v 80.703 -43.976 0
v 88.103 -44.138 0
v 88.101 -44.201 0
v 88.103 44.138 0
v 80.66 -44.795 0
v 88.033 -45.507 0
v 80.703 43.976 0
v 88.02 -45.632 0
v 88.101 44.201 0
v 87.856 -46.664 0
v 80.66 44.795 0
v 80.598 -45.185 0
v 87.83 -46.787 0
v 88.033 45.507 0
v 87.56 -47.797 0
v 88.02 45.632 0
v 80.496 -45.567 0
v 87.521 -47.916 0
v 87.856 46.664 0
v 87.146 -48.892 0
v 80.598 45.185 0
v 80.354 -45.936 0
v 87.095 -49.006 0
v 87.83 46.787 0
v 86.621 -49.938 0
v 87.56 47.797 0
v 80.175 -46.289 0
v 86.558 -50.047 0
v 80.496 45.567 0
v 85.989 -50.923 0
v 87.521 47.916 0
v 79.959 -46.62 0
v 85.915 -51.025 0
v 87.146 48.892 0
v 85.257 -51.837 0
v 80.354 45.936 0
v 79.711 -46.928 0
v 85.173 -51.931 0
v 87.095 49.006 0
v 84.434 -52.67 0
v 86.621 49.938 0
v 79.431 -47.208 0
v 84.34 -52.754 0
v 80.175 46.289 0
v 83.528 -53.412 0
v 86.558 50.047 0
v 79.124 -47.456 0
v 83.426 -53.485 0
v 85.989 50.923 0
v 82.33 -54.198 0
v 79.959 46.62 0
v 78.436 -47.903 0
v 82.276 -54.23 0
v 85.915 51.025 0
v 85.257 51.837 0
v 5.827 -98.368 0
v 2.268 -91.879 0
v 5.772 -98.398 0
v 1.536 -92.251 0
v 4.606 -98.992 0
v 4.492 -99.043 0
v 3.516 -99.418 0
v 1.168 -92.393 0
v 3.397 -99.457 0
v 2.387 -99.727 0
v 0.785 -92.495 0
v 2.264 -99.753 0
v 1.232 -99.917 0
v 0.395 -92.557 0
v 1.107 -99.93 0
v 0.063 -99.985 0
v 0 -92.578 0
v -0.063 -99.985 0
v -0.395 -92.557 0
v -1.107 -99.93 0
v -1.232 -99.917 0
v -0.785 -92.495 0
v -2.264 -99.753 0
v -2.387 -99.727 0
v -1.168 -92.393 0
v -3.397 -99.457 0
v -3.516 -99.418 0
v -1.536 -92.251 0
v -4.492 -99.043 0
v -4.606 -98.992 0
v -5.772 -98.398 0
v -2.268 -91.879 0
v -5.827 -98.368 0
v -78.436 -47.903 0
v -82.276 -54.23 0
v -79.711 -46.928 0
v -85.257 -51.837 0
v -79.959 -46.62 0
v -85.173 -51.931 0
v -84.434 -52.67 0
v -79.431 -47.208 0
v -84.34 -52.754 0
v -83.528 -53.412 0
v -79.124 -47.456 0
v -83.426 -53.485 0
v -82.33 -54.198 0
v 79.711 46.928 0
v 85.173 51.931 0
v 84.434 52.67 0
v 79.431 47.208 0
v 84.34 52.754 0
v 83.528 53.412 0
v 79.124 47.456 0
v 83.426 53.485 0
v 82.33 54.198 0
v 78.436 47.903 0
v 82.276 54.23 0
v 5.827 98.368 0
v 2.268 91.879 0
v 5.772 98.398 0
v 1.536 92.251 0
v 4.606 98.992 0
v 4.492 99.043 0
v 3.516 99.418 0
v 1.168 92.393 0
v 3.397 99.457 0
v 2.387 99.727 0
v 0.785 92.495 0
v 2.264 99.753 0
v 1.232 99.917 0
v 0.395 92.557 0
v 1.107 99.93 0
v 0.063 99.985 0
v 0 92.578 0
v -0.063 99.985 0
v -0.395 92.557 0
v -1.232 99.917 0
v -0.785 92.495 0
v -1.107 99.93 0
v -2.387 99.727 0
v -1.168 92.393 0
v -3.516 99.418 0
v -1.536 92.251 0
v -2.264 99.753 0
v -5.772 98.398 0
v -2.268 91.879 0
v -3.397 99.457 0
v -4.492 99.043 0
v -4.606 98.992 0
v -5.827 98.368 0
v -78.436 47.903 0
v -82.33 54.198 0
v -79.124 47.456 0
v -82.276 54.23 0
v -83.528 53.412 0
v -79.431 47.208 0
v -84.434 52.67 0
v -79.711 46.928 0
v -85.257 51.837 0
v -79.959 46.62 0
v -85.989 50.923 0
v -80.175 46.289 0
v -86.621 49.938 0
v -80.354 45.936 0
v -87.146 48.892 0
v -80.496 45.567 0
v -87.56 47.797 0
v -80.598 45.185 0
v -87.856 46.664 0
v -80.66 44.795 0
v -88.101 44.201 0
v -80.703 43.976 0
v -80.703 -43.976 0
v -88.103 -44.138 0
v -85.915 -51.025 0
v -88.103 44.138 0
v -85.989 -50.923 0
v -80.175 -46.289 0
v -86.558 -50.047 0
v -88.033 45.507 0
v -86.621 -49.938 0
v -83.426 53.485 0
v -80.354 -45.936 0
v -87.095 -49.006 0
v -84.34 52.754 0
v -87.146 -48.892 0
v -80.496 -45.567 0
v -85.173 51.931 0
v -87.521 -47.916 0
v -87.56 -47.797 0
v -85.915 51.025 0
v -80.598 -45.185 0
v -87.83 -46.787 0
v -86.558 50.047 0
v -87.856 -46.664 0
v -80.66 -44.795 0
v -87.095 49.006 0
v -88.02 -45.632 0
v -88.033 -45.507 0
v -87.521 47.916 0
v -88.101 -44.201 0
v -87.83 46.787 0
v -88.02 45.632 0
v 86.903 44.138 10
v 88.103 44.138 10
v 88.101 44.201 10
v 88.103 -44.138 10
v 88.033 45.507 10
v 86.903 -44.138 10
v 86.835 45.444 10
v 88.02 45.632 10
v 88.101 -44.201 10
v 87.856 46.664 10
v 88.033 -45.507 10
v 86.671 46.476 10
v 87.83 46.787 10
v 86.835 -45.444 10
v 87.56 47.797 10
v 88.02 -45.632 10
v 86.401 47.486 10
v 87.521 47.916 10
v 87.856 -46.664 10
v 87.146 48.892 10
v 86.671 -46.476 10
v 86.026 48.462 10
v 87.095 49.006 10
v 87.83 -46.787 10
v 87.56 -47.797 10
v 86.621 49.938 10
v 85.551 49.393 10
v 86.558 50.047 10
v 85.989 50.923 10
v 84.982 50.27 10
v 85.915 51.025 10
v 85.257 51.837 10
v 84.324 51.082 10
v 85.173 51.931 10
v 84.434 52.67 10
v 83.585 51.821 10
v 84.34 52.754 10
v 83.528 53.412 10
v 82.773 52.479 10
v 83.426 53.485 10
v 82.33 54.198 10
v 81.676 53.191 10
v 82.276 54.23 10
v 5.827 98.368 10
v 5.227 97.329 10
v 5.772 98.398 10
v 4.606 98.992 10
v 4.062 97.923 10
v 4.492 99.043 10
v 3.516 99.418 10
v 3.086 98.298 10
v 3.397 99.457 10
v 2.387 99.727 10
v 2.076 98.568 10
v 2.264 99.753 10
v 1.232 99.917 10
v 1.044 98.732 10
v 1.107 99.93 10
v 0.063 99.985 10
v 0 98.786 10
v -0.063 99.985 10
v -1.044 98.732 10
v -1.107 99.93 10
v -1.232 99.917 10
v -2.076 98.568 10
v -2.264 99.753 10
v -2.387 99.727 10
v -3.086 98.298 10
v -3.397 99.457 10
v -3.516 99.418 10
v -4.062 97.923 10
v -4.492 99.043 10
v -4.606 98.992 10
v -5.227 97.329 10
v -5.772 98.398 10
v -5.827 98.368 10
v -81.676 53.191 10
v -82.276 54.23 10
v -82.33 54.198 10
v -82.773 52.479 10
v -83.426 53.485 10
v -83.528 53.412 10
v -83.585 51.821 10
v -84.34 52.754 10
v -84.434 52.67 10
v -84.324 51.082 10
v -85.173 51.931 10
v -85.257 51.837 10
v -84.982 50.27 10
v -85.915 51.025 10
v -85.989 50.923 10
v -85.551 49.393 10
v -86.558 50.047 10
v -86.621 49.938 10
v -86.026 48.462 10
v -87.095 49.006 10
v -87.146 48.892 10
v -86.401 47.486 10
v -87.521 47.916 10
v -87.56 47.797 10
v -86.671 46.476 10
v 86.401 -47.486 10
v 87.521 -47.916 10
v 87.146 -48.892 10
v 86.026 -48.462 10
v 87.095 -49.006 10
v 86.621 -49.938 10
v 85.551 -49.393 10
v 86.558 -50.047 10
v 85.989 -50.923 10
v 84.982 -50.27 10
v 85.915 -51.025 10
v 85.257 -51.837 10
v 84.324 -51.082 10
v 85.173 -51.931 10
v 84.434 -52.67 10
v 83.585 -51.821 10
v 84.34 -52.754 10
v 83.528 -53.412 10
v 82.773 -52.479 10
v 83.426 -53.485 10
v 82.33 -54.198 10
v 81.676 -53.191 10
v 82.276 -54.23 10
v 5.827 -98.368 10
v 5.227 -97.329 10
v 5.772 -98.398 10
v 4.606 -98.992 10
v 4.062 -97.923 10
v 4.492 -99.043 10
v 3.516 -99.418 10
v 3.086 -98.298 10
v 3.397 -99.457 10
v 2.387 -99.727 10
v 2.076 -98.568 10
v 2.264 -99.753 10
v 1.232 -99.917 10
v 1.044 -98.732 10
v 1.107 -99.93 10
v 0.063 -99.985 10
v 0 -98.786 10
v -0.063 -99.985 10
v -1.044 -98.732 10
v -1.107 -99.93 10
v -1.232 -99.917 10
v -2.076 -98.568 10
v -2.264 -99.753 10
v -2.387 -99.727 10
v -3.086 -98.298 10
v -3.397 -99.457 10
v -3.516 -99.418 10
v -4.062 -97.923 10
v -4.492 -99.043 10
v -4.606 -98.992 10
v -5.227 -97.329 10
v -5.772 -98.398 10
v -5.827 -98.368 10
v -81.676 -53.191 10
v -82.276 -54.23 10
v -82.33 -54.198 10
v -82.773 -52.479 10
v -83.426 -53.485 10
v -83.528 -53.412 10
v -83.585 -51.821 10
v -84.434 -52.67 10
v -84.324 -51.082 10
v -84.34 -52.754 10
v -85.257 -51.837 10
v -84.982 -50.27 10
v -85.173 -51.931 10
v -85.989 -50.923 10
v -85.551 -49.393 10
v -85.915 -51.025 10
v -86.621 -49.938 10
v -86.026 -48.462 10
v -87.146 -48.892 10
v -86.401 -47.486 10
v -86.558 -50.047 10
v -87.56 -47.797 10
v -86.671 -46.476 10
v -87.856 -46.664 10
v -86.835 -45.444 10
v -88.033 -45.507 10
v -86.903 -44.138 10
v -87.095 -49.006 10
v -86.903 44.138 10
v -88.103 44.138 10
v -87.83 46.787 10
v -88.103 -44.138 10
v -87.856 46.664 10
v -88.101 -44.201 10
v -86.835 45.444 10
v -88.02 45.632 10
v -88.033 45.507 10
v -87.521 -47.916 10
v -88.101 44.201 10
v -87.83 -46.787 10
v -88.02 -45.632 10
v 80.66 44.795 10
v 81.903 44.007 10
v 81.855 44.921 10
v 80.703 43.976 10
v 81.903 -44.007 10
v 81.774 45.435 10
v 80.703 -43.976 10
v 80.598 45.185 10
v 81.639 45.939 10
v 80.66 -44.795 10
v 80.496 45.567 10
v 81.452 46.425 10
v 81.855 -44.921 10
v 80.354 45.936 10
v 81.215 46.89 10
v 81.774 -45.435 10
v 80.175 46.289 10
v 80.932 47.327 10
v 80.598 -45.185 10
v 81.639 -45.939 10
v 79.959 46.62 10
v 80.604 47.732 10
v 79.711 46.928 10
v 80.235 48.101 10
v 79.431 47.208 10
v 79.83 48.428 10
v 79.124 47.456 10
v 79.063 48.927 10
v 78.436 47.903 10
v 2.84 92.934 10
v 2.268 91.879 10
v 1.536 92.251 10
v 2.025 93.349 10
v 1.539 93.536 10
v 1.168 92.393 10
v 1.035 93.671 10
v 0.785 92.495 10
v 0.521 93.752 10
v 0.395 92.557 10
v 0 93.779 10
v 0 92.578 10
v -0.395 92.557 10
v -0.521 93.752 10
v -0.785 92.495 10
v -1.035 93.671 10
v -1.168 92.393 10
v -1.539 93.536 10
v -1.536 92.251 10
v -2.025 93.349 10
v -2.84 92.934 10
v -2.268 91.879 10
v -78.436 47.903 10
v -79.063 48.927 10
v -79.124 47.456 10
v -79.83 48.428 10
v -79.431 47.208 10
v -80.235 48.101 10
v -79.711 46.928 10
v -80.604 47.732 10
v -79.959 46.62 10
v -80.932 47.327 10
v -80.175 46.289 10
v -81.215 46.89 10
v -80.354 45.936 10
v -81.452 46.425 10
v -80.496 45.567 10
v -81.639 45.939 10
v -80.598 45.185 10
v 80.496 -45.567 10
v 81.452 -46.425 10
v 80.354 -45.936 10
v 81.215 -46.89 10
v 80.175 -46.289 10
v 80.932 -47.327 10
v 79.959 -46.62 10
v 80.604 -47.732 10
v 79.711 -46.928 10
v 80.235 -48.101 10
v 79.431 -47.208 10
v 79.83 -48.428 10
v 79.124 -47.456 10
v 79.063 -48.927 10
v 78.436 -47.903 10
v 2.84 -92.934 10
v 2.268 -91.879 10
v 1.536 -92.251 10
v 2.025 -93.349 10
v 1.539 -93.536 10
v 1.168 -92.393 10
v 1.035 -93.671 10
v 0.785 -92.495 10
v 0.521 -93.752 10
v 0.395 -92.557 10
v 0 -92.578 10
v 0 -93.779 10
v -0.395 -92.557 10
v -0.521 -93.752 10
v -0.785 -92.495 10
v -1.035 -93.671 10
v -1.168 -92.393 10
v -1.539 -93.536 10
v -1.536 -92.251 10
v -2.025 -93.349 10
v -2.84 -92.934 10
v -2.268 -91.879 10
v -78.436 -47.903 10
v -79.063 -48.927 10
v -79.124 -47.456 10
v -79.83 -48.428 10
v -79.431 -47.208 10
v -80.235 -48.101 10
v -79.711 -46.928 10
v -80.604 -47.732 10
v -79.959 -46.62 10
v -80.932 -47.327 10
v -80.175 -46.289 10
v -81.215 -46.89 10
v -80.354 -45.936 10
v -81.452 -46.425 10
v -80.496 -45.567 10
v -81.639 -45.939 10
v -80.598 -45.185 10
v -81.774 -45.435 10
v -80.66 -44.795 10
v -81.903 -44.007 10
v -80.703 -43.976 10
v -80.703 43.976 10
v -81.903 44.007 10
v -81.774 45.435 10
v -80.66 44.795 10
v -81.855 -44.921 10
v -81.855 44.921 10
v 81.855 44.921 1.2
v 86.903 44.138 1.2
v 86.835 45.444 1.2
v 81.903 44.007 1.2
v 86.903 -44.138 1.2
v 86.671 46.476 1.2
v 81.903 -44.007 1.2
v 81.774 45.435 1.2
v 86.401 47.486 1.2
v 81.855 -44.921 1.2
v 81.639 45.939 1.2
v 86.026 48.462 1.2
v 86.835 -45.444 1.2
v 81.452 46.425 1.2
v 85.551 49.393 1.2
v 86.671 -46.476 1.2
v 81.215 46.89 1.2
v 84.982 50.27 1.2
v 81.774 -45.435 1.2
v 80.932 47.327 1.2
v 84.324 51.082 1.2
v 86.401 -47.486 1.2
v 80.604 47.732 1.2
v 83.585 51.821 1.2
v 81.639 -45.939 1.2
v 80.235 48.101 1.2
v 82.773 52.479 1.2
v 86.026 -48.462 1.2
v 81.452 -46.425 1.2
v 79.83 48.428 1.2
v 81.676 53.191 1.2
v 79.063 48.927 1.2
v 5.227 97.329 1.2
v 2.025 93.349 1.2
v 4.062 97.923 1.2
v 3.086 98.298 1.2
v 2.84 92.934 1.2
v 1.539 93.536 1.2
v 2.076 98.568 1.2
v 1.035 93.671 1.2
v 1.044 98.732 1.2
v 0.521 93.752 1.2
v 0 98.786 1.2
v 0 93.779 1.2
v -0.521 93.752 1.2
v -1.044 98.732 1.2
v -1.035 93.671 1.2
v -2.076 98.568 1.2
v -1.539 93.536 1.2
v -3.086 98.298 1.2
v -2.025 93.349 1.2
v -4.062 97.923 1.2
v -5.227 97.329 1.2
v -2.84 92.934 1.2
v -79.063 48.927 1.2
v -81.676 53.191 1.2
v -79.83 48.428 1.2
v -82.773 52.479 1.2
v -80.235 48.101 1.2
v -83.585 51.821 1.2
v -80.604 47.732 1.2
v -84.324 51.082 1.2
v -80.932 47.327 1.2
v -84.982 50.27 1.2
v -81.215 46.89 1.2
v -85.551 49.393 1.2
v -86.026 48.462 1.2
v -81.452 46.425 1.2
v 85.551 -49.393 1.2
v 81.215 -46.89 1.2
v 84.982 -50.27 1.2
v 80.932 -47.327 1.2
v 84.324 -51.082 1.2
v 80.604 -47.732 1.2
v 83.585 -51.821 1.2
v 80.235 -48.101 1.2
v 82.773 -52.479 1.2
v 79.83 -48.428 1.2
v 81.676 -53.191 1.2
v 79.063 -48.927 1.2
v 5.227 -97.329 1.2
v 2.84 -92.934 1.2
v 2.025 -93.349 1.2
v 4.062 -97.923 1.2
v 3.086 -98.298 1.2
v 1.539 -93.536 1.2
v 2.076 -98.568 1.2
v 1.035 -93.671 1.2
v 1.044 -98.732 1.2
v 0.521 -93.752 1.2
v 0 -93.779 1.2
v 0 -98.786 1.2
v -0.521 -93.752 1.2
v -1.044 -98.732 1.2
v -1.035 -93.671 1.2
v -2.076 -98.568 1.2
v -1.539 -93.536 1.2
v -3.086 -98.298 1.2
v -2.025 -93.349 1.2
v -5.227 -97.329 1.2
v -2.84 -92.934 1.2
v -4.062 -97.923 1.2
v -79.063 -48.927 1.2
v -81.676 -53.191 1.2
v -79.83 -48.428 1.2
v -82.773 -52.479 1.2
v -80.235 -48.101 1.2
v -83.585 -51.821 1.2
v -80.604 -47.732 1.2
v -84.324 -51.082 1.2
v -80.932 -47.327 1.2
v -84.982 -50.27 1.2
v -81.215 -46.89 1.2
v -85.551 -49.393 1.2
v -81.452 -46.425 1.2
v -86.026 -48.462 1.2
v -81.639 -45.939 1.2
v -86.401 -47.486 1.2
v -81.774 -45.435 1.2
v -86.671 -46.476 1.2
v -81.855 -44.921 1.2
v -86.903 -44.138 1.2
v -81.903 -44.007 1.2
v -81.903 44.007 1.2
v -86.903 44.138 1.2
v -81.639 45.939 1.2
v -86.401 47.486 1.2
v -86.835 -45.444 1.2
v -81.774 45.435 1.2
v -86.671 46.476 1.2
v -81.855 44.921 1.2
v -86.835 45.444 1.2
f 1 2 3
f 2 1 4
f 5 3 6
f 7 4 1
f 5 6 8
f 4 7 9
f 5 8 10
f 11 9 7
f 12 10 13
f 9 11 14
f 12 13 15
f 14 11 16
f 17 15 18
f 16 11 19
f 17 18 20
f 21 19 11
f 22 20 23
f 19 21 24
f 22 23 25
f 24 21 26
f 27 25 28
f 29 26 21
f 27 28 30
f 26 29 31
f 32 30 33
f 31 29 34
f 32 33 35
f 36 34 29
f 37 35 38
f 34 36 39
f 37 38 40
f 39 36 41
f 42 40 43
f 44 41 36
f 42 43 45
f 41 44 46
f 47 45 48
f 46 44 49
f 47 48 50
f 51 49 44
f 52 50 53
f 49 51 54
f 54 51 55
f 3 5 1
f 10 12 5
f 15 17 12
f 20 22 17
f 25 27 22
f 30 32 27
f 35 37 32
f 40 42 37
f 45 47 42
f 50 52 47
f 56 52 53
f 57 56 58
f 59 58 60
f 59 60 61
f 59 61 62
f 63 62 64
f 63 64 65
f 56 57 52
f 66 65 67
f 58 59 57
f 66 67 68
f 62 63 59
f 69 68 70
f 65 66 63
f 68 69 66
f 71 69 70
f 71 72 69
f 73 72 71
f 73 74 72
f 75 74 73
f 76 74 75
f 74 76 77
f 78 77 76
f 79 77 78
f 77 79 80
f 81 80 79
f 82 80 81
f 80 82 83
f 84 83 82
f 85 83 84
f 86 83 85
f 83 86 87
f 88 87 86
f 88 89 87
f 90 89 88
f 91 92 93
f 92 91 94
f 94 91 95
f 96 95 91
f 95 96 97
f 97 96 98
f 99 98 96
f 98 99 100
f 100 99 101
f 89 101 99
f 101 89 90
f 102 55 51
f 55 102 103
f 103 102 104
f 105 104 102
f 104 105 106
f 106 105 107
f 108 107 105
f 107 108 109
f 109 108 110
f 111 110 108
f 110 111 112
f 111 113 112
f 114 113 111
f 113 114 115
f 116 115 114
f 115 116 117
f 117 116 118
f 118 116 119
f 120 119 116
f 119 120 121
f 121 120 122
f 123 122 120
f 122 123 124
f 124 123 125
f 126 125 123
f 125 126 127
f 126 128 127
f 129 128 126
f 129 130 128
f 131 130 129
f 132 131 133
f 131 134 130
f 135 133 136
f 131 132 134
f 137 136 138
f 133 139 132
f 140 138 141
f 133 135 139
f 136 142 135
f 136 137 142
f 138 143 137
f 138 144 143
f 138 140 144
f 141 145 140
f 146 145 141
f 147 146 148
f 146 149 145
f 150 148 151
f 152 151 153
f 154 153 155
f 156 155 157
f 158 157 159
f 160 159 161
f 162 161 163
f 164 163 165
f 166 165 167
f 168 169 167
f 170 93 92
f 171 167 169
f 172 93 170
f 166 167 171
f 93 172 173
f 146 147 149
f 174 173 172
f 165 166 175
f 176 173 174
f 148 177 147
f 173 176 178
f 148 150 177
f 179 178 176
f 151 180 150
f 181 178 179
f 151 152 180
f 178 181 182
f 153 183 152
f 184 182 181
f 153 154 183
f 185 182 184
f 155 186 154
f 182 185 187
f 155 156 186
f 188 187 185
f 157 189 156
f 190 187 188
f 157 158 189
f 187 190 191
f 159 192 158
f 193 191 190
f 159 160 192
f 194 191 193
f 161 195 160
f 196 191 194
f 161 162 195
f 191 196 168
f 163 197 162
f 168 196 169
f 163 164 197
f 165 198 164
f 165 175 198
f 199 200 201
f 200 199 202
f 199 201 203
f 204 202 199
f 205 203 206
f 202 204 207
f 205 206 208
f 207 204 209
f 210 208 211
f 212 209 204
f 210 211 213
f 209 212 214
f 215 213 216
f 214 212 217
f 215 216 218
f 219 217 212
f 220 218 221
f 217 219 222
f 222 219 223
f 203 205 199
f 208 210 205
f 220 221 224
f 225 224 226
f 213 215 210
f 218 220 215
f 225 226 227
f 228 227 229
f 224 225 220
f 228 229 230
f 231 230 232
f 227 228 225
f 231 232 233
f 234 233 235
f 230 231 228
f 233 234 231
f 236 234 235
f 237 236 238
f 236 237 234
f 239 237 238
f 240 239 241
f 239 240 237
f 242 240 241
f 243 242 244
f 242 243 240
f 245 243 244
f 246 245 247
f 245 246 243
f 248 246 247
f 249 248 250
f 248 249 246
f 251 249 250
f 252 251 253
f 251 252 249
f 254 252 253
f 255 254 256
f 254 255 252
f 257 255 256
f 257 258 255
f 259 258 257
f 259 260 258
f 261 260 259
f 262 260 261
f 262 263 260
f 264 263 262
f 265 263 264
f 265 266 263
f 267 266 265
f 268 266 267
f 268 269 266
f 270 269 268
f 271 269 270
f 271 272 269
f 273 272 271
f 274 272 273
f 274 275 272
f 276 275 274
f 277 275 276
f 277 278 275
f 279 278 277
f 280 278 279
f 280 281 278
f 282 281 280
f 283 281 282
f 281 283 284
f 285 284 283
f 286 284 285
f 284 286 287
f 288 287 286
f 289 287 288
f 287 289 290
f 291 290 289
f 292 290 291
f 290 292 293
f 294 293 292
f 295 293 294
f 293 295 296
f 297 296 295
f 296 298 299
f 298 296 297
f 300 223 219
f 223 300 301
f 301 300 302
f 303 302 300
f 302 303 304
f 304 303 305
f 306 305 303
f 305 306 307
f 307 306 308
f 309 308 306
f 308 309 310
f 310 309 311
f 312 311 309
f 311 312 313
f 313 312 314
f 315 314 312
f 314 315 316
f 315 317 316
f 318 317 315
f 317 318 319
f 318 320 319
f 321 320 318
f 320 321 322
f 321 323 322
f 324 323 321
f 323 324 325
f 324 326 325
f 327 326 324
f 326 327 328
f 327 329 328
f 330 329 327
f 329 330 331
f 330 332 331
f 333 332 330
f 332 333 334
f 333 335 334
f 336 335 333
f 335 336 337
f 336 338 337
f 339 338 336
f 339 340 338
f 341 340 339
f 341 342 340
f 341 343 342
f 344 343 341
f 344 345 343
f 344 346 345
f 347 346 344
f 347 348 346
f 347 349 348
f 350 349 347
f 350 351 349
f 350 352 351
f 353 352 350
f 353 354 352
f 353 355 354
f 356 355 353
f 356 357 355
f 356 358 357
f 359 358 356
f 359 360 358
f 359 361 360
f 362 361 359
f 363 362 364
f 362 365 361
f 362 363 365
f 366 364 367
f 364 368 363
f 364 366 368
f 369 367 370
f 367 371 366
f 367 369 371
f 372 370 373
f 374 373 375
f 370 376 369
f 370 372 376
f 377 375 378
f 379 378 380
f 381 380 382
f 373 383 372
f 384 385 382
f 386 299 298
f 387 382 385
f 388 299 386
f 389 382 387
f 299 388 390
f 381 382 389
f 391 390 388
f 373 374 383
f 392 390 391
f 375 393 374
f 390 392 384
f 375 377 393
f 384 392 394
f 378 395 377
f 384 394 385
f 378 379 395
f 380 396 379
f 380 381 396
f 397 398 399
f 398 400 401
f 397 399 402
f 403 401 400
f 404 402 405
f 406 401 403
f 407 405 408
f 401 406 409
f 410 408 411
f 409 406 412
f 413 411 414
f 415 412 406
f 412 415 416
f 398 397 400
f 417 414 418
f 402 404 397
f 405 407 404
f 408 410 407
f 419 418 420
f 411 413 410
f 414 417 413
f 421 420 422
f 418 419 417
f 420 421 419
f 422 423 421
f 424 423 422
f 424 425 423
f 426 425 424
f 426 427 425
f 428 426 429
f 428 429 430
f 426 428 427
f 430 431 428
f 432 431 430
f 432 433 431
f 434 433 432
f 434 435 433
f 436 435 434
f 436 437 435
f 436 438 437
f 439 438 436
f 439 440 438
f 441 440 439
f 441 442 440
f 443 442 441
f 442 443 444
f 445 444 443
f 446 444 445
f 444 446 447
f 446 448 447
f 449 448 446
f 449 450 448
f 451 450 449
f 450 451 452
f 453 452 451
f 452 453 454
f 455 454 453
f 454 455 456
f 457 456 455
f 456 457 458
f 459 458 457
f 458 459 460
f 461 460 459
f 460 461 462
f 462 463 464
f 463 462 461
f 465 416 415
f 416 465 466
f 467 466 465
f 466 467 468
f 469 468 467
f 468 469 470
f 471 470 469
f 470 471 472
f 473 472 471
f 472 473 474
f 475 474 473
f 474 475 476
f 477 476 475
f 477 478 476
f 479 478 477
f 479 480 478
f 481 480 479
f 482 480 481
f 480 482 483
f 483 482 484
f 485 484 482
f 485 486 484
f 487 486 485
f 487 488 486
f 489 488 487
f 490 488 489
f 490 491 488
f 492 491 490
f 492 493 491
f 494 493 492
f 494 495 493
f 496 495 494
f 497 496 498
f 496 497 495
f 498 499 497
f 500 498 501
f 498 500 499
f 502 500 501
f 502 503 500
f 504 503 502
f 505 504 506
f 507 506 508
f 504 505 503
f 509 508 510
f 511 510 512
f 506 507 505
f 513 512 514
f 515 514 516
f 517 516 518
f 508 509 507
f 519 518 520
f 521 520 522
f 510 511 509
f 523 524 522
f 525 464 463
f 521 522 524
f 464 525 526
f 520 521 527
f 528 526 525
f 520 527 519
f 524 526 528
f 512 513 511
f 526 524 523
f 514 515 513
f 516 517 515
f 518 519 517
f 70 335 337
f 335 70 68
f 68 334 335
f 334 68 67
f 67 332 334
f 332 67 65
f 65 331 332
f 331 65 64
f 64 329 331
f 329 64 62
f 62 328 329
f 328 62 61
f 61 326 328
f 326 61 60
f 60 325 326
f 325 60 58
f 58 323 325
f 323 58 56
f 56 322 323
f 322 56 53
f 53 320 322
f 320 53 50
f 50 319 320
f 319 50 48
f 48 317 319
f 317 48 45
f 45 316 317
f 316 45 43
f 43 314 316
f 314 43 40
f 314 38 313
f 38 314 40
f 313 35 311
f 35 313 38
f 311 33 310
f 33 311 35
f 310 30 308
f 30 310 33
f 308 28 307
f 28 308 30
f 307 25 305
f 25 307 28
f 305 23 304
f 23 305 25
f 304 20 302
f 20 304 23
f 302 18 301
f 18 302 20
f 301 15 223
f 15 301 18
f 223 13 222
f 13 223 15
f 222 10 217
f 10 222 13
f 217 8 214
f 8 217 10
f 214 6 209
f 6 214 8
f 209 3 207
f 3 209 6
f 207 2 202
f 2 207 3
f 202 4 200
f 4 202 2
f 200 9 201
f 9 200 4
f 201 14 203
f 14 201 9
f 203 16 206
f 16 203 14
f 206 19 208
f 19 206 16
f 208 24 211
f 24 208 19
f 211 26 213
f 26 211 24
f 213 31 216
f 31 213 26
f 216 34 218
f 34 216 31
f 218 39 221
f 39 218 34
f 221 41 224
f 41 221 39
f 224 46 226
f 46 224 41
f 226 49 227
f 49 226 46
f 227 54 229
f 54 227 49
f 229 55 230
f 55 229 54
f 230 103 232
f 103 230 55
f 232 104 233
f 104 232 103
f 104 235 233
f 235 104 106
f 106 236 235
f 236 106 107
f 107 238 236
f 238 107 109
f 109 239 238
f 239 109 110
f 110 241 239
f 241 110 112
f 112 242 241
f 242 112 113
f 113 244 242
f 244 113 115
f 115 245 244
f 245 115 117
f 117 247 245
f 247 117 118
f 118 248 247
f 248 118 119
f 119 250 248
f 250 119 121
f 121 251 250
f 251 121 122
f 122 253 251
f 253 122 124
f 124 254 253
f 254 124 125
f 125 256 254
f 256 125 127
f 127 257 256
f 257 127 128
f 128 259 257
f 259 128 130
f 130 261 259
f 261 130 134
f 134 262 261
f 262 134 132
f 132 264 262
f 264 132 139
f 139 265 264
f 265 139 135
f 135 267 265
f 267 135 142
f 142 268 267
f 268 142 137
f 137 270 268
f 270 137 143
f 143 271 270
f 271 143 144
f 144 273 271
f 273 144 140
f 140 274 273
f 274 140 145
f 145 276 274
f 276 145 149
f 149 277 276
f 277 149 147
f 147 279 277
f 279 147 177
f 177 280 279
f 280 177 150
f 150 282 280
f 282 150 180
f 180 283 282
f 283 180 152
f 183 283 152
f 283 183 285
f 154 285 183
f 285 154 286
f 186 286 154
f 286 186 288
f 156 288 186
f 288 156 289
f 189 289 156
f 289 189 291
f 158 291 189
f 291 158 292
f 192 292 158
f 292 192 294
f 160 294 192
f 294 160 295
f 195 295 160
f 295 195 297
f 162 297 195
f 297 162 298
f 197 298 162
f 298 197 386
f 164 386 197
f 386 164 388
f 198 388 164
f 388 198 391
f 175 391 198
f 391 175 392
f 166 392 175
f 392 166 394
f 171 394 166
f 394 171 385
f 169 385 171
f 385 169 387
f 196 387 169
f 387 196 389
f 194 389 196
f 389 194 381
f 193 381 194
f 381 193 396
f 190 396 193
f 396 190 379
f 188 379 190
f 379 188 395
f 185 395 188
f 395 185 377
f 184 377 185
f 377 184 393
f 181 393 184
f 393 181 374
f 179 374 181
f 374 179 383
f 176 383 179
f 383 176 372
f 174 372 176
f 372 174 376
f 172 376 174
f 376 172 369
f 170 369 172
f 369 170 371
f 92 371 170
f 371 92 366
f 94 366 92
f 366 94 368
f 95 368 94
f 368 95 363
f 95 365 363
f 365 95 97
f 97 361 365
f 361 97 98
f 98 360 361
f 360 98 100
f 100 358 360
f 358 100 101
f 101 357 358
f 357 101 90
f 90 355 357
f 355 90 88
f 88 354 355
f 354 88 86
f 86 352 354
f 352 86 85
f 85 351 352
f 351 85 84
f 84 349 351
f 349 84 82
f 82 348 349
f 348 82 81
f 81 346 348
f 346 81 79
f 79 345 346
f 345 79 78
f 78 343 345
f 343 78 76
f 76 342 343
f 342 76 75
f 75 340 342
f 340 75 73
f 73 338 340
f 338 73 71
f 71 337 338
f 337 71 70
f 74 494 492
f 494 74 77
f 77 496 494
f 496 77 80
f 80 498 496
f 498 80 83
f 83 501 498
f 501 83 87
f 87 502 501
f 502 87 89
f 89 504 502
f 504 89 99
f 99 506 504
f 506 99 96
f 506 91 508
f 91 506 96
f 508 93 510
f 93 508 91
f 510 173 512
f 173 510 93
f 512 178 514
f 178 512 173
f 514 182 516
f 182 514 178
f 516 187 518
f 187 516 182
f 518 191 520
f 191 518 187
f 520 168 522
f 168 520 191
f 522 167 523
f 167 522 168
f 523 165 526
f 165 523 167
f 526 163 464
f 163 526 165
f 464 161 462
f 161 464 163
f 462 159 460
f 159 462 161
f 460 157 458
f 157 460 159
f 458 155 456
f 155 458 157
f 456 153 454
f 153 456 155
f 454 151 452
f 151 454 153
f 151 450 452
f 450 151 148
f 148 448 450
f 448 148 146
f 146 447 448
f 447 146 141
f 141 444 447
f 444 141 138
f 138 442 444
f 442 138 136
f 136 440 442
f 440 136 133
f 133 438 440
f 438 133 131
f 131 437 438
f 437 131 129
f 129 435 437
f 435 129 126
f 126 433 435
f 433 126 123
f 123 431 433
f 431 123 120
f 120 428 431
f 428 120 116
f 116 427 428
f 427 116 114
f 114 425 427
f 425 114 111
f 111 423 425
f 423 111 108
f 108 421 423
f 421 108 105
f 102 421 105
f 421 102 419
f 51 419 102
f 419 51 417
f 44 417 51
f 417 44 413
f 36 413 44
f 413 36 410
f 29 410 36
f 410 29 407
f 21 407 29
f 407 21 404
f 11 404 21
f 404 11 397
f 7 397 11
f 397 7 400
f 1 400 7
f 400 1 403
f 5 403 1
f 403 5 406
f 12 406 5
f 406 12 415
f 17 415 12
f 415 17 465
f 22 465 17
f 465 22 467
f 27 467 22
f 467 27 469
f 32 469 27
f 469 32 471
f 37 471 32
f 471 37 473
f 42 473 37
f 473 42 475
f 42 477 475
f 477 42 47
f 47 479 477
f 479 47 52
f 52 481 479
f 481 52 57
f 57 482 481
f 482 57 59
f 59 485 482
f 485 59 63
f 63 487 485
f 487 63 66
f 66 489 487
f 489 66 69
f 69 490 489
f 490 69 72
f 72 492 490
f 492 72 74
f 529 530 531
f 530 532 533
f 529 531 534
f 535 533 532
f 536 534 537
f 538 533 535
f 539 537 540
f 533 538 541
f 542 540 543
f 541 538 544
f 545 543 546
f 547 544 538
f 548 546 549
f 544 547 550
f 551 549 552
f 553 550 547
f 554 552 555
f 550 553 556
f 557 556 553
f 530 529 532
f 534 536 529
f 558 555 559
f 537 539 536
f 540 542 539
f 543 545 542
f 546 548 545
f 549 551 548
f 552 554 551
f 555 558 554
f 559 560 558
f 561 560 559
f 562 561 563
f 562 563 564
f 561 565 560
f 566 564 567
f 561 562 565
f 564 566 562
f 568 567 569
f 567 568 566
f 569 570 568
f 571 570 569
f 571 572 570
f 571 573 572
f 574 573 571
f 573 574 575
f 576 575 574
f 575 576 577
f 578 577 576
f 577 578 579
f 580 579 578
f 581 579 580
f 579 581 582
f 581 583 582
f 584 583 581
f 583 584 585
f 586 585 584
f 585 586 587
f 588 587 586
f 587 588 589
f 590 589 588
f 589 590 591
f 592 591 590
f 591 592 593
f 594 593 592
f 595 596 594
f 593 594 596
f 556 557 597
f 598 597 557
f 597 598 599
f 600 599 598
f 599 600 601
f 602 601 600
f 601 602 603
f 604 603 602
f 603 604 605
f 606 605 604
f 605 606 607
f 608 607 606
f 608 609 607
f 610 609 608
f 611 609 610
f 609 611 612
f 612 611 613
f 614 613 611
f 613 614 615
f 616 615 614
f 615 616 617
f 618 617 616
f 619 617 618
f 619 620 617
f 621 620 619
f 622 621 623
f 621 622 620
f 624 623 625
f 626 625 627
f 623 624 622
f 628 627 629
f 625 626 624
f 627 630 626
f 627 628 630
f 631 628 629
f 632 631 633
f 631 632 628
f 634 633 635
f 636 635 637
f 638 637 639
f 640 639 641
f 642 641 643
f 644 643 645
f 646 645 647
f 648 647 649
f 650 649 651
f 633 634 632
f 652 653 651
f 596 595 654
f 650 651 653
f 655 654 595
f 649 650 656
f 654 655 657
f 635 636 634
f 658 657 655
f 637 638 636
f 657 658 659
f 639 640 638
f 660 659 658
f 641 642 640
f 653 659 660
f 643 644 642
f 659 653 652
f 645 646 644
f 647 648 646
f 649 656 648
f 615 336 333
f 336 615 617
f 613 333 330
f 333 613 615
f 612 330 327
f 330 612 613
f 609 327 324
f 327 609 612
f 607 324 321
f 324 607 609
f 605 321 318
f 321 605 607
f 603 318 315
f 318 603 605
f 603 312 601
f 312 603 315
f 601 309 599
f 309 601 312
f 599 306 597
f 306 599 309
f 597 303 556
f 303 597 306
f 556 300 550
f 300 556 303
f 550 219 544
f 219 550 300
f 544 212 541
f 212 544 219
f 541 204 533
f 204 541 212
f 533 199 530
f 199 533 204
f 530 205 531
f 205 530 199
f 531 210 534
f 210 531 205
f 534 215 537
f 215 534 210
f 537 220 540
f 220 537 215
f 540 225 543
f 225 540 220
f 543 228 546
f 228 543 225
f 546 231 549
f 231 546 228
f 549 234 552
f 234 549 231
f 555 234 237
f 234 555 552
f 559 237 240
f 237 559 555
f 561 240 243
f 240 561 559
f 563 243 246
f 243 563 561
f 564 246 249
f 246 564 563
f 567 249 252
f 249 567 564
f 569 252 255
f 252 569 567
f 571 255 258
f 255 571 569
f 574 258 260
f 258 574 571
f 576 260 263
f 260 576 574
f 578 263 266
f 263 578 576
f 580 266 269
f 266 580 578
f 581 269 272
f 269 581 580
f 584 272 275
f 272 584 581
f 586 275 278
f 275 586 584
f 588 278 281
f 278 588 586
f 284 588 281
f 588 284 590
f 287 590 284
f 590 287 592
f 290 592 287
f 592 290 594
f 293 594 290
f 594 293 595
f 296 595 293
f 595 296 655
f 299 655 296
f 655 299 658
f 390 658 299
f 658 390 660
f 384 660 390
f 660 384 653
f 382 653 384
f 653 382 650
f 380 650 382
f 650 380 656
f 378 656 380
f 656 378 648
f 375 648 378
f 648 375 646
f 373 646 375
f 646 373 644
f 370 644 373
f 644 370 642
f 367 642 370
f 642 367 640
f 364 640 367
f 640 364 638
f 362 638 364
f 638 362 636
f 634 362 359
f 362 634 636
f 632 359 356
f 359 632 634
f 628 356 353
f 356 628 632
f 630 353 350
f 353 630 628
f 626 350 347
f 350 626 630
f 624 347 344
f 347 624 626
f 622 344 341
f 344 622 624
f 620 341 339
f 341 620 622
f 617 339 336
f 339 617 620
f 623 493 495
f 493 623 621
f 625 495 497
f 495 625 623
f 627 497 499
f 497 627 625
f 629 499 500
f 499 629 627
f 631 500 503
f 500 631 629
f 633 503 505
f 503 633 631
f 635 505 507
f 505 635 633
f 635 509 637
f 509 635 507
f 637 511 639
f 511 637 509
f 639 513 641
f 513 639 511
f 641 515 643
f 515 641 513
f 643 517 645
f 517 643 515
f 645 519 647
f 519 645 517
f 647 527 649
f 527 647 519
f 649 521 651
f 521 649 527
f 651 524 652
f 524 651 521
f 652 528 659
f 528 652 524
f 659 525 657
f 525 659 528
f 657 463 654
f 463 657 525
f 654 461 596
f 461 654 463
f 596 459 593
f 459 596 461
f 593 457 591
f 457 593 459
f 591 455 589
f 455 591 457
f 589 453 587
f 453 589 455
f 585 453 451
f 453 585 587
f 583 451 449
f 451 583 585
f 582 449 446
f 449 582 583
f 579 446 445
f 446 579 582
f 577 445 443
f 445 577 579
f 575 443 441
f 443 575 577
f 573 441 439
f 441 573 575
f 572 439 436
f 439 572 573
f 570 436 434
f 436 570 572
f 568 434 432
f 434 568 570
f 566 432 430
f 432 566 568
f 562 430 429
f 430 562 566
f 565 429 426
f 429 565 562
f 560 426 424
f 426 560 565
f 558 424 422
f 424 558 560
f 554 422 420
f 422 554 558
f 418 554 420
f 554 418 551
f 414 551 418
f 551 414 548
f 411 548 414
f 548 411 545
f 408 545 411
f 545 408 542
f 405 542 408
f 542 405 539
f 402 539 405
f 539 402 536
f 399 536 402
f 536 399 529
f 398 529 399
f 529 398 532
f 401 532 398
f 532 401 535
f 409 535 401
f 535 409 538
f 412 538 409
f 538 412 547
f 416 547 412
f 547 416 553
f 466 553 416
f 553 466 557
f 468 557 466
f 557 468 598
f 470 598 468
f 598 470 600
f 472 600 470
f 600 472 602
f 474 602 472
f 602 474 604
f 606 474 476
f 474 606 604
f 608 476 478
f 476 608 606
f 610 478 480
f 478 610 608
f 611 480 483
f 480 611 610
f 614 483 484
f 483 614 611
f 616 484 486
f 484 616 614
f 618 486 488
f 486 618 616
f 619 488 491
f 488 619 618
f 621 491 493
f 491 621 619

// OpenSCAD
// file: include/LEDneon.scad
// OpenSCAD LED neon modules
// to be included in own OpenSCAD scripts
//

module roundoff2d(rr=20) {
    offset(r=-rr/2)
        offset(r=rr)
            children();
}

module genslot2d(sw=5) {
    difference() {
        children();
        offset(r=-sw)
            children();
    }
}

module genslot3d(sw=5, rr=20, h=10) {
    linear_extrude(height=h)
        genslot2d(sw=sw)
            roundoff2d(rr=rr)
                children();
}

module wall3d(ww=1.2, sw=5, rr=20, h=10) {
    linear_extrude(height=h)
        offset(r=ww)
            genslot2d(sw=sw)
                roundoff2d(rr=rr)
                    children();
}

module frame3d(ww=1.2, sw=5, rr=20, h=10, fl=1.2) {
    difference() {
        wall3d(ww=ww, sw=sw, rr=rr, h=h)
            children();
        translate([0,0,fl])
            genslot3d(sw=sw, rr=rr, h=h)
                children();
    }
}
// file: include/shapes2D.scad
// Some 2D shapes for LED neon
// to be included in own OpenSCAD scripts
//

module ngon2d(n=6, r=100) {
    delta = 360 / n;
    pp = [
        for(i = [0:n-1])
            [sin(i*delta)*r, cos(i*delta)*r] 
    ];
    polygon(pp);
}

module star2d(points=5, ro=100, ri=30) {
    delta = 180 / points;
    rd = ro - ri;
    pp = [
        for(i = [0:2*points-1])
            [sin(i*delta)*(ro-rd*(i%2)), cos(i*delta)*(ro-rd*(i%2))] 
    ];
    polygon(pp);
}

module letterC2d(ro=100, ri=70) {
    difference() {
        circle(r=ro);
        circle(r=ri);
        rotate([0,0,-45])
            square(ro);
    }
}

module letterO2d(ro=100, ri=70) {
    difference() {
        circle(r=ro);
        circle(r=ri);
    }
}
// file: neon-dimension.scad
// Global parameter file for the neon tape
//
// Can be included in individual files,
// parameters can be overwritten there.
//

//Rounding radius
rr = 18;

//Slot (tape) width (<rr/2)
sw = 5;

//Total height (incl. floor)
h = 10;

//Wall width
ww = 1.2;

//Floor height
fl = 1.2;
// main file
// OpenSCAD LED neon hexagon
//

//Global parameters for the dimension of the LED neon tape
include <neon-dimension.scad>

//You can change the global settings for individual shapes:
//Rounding radius
rr = 20;

//Number of edges
n = 6;

//Radius
r = 100 - rr / 2 - ww;

///////////////////////////
$fn=60;

include <include/shapes2D.scad>;
include <include/LEDneon.scad>;

frame3d(ww=ww, sw=sw, rr=rr, h=h, fl=fl) {
    ngon2d(n=n, r=r);
}
